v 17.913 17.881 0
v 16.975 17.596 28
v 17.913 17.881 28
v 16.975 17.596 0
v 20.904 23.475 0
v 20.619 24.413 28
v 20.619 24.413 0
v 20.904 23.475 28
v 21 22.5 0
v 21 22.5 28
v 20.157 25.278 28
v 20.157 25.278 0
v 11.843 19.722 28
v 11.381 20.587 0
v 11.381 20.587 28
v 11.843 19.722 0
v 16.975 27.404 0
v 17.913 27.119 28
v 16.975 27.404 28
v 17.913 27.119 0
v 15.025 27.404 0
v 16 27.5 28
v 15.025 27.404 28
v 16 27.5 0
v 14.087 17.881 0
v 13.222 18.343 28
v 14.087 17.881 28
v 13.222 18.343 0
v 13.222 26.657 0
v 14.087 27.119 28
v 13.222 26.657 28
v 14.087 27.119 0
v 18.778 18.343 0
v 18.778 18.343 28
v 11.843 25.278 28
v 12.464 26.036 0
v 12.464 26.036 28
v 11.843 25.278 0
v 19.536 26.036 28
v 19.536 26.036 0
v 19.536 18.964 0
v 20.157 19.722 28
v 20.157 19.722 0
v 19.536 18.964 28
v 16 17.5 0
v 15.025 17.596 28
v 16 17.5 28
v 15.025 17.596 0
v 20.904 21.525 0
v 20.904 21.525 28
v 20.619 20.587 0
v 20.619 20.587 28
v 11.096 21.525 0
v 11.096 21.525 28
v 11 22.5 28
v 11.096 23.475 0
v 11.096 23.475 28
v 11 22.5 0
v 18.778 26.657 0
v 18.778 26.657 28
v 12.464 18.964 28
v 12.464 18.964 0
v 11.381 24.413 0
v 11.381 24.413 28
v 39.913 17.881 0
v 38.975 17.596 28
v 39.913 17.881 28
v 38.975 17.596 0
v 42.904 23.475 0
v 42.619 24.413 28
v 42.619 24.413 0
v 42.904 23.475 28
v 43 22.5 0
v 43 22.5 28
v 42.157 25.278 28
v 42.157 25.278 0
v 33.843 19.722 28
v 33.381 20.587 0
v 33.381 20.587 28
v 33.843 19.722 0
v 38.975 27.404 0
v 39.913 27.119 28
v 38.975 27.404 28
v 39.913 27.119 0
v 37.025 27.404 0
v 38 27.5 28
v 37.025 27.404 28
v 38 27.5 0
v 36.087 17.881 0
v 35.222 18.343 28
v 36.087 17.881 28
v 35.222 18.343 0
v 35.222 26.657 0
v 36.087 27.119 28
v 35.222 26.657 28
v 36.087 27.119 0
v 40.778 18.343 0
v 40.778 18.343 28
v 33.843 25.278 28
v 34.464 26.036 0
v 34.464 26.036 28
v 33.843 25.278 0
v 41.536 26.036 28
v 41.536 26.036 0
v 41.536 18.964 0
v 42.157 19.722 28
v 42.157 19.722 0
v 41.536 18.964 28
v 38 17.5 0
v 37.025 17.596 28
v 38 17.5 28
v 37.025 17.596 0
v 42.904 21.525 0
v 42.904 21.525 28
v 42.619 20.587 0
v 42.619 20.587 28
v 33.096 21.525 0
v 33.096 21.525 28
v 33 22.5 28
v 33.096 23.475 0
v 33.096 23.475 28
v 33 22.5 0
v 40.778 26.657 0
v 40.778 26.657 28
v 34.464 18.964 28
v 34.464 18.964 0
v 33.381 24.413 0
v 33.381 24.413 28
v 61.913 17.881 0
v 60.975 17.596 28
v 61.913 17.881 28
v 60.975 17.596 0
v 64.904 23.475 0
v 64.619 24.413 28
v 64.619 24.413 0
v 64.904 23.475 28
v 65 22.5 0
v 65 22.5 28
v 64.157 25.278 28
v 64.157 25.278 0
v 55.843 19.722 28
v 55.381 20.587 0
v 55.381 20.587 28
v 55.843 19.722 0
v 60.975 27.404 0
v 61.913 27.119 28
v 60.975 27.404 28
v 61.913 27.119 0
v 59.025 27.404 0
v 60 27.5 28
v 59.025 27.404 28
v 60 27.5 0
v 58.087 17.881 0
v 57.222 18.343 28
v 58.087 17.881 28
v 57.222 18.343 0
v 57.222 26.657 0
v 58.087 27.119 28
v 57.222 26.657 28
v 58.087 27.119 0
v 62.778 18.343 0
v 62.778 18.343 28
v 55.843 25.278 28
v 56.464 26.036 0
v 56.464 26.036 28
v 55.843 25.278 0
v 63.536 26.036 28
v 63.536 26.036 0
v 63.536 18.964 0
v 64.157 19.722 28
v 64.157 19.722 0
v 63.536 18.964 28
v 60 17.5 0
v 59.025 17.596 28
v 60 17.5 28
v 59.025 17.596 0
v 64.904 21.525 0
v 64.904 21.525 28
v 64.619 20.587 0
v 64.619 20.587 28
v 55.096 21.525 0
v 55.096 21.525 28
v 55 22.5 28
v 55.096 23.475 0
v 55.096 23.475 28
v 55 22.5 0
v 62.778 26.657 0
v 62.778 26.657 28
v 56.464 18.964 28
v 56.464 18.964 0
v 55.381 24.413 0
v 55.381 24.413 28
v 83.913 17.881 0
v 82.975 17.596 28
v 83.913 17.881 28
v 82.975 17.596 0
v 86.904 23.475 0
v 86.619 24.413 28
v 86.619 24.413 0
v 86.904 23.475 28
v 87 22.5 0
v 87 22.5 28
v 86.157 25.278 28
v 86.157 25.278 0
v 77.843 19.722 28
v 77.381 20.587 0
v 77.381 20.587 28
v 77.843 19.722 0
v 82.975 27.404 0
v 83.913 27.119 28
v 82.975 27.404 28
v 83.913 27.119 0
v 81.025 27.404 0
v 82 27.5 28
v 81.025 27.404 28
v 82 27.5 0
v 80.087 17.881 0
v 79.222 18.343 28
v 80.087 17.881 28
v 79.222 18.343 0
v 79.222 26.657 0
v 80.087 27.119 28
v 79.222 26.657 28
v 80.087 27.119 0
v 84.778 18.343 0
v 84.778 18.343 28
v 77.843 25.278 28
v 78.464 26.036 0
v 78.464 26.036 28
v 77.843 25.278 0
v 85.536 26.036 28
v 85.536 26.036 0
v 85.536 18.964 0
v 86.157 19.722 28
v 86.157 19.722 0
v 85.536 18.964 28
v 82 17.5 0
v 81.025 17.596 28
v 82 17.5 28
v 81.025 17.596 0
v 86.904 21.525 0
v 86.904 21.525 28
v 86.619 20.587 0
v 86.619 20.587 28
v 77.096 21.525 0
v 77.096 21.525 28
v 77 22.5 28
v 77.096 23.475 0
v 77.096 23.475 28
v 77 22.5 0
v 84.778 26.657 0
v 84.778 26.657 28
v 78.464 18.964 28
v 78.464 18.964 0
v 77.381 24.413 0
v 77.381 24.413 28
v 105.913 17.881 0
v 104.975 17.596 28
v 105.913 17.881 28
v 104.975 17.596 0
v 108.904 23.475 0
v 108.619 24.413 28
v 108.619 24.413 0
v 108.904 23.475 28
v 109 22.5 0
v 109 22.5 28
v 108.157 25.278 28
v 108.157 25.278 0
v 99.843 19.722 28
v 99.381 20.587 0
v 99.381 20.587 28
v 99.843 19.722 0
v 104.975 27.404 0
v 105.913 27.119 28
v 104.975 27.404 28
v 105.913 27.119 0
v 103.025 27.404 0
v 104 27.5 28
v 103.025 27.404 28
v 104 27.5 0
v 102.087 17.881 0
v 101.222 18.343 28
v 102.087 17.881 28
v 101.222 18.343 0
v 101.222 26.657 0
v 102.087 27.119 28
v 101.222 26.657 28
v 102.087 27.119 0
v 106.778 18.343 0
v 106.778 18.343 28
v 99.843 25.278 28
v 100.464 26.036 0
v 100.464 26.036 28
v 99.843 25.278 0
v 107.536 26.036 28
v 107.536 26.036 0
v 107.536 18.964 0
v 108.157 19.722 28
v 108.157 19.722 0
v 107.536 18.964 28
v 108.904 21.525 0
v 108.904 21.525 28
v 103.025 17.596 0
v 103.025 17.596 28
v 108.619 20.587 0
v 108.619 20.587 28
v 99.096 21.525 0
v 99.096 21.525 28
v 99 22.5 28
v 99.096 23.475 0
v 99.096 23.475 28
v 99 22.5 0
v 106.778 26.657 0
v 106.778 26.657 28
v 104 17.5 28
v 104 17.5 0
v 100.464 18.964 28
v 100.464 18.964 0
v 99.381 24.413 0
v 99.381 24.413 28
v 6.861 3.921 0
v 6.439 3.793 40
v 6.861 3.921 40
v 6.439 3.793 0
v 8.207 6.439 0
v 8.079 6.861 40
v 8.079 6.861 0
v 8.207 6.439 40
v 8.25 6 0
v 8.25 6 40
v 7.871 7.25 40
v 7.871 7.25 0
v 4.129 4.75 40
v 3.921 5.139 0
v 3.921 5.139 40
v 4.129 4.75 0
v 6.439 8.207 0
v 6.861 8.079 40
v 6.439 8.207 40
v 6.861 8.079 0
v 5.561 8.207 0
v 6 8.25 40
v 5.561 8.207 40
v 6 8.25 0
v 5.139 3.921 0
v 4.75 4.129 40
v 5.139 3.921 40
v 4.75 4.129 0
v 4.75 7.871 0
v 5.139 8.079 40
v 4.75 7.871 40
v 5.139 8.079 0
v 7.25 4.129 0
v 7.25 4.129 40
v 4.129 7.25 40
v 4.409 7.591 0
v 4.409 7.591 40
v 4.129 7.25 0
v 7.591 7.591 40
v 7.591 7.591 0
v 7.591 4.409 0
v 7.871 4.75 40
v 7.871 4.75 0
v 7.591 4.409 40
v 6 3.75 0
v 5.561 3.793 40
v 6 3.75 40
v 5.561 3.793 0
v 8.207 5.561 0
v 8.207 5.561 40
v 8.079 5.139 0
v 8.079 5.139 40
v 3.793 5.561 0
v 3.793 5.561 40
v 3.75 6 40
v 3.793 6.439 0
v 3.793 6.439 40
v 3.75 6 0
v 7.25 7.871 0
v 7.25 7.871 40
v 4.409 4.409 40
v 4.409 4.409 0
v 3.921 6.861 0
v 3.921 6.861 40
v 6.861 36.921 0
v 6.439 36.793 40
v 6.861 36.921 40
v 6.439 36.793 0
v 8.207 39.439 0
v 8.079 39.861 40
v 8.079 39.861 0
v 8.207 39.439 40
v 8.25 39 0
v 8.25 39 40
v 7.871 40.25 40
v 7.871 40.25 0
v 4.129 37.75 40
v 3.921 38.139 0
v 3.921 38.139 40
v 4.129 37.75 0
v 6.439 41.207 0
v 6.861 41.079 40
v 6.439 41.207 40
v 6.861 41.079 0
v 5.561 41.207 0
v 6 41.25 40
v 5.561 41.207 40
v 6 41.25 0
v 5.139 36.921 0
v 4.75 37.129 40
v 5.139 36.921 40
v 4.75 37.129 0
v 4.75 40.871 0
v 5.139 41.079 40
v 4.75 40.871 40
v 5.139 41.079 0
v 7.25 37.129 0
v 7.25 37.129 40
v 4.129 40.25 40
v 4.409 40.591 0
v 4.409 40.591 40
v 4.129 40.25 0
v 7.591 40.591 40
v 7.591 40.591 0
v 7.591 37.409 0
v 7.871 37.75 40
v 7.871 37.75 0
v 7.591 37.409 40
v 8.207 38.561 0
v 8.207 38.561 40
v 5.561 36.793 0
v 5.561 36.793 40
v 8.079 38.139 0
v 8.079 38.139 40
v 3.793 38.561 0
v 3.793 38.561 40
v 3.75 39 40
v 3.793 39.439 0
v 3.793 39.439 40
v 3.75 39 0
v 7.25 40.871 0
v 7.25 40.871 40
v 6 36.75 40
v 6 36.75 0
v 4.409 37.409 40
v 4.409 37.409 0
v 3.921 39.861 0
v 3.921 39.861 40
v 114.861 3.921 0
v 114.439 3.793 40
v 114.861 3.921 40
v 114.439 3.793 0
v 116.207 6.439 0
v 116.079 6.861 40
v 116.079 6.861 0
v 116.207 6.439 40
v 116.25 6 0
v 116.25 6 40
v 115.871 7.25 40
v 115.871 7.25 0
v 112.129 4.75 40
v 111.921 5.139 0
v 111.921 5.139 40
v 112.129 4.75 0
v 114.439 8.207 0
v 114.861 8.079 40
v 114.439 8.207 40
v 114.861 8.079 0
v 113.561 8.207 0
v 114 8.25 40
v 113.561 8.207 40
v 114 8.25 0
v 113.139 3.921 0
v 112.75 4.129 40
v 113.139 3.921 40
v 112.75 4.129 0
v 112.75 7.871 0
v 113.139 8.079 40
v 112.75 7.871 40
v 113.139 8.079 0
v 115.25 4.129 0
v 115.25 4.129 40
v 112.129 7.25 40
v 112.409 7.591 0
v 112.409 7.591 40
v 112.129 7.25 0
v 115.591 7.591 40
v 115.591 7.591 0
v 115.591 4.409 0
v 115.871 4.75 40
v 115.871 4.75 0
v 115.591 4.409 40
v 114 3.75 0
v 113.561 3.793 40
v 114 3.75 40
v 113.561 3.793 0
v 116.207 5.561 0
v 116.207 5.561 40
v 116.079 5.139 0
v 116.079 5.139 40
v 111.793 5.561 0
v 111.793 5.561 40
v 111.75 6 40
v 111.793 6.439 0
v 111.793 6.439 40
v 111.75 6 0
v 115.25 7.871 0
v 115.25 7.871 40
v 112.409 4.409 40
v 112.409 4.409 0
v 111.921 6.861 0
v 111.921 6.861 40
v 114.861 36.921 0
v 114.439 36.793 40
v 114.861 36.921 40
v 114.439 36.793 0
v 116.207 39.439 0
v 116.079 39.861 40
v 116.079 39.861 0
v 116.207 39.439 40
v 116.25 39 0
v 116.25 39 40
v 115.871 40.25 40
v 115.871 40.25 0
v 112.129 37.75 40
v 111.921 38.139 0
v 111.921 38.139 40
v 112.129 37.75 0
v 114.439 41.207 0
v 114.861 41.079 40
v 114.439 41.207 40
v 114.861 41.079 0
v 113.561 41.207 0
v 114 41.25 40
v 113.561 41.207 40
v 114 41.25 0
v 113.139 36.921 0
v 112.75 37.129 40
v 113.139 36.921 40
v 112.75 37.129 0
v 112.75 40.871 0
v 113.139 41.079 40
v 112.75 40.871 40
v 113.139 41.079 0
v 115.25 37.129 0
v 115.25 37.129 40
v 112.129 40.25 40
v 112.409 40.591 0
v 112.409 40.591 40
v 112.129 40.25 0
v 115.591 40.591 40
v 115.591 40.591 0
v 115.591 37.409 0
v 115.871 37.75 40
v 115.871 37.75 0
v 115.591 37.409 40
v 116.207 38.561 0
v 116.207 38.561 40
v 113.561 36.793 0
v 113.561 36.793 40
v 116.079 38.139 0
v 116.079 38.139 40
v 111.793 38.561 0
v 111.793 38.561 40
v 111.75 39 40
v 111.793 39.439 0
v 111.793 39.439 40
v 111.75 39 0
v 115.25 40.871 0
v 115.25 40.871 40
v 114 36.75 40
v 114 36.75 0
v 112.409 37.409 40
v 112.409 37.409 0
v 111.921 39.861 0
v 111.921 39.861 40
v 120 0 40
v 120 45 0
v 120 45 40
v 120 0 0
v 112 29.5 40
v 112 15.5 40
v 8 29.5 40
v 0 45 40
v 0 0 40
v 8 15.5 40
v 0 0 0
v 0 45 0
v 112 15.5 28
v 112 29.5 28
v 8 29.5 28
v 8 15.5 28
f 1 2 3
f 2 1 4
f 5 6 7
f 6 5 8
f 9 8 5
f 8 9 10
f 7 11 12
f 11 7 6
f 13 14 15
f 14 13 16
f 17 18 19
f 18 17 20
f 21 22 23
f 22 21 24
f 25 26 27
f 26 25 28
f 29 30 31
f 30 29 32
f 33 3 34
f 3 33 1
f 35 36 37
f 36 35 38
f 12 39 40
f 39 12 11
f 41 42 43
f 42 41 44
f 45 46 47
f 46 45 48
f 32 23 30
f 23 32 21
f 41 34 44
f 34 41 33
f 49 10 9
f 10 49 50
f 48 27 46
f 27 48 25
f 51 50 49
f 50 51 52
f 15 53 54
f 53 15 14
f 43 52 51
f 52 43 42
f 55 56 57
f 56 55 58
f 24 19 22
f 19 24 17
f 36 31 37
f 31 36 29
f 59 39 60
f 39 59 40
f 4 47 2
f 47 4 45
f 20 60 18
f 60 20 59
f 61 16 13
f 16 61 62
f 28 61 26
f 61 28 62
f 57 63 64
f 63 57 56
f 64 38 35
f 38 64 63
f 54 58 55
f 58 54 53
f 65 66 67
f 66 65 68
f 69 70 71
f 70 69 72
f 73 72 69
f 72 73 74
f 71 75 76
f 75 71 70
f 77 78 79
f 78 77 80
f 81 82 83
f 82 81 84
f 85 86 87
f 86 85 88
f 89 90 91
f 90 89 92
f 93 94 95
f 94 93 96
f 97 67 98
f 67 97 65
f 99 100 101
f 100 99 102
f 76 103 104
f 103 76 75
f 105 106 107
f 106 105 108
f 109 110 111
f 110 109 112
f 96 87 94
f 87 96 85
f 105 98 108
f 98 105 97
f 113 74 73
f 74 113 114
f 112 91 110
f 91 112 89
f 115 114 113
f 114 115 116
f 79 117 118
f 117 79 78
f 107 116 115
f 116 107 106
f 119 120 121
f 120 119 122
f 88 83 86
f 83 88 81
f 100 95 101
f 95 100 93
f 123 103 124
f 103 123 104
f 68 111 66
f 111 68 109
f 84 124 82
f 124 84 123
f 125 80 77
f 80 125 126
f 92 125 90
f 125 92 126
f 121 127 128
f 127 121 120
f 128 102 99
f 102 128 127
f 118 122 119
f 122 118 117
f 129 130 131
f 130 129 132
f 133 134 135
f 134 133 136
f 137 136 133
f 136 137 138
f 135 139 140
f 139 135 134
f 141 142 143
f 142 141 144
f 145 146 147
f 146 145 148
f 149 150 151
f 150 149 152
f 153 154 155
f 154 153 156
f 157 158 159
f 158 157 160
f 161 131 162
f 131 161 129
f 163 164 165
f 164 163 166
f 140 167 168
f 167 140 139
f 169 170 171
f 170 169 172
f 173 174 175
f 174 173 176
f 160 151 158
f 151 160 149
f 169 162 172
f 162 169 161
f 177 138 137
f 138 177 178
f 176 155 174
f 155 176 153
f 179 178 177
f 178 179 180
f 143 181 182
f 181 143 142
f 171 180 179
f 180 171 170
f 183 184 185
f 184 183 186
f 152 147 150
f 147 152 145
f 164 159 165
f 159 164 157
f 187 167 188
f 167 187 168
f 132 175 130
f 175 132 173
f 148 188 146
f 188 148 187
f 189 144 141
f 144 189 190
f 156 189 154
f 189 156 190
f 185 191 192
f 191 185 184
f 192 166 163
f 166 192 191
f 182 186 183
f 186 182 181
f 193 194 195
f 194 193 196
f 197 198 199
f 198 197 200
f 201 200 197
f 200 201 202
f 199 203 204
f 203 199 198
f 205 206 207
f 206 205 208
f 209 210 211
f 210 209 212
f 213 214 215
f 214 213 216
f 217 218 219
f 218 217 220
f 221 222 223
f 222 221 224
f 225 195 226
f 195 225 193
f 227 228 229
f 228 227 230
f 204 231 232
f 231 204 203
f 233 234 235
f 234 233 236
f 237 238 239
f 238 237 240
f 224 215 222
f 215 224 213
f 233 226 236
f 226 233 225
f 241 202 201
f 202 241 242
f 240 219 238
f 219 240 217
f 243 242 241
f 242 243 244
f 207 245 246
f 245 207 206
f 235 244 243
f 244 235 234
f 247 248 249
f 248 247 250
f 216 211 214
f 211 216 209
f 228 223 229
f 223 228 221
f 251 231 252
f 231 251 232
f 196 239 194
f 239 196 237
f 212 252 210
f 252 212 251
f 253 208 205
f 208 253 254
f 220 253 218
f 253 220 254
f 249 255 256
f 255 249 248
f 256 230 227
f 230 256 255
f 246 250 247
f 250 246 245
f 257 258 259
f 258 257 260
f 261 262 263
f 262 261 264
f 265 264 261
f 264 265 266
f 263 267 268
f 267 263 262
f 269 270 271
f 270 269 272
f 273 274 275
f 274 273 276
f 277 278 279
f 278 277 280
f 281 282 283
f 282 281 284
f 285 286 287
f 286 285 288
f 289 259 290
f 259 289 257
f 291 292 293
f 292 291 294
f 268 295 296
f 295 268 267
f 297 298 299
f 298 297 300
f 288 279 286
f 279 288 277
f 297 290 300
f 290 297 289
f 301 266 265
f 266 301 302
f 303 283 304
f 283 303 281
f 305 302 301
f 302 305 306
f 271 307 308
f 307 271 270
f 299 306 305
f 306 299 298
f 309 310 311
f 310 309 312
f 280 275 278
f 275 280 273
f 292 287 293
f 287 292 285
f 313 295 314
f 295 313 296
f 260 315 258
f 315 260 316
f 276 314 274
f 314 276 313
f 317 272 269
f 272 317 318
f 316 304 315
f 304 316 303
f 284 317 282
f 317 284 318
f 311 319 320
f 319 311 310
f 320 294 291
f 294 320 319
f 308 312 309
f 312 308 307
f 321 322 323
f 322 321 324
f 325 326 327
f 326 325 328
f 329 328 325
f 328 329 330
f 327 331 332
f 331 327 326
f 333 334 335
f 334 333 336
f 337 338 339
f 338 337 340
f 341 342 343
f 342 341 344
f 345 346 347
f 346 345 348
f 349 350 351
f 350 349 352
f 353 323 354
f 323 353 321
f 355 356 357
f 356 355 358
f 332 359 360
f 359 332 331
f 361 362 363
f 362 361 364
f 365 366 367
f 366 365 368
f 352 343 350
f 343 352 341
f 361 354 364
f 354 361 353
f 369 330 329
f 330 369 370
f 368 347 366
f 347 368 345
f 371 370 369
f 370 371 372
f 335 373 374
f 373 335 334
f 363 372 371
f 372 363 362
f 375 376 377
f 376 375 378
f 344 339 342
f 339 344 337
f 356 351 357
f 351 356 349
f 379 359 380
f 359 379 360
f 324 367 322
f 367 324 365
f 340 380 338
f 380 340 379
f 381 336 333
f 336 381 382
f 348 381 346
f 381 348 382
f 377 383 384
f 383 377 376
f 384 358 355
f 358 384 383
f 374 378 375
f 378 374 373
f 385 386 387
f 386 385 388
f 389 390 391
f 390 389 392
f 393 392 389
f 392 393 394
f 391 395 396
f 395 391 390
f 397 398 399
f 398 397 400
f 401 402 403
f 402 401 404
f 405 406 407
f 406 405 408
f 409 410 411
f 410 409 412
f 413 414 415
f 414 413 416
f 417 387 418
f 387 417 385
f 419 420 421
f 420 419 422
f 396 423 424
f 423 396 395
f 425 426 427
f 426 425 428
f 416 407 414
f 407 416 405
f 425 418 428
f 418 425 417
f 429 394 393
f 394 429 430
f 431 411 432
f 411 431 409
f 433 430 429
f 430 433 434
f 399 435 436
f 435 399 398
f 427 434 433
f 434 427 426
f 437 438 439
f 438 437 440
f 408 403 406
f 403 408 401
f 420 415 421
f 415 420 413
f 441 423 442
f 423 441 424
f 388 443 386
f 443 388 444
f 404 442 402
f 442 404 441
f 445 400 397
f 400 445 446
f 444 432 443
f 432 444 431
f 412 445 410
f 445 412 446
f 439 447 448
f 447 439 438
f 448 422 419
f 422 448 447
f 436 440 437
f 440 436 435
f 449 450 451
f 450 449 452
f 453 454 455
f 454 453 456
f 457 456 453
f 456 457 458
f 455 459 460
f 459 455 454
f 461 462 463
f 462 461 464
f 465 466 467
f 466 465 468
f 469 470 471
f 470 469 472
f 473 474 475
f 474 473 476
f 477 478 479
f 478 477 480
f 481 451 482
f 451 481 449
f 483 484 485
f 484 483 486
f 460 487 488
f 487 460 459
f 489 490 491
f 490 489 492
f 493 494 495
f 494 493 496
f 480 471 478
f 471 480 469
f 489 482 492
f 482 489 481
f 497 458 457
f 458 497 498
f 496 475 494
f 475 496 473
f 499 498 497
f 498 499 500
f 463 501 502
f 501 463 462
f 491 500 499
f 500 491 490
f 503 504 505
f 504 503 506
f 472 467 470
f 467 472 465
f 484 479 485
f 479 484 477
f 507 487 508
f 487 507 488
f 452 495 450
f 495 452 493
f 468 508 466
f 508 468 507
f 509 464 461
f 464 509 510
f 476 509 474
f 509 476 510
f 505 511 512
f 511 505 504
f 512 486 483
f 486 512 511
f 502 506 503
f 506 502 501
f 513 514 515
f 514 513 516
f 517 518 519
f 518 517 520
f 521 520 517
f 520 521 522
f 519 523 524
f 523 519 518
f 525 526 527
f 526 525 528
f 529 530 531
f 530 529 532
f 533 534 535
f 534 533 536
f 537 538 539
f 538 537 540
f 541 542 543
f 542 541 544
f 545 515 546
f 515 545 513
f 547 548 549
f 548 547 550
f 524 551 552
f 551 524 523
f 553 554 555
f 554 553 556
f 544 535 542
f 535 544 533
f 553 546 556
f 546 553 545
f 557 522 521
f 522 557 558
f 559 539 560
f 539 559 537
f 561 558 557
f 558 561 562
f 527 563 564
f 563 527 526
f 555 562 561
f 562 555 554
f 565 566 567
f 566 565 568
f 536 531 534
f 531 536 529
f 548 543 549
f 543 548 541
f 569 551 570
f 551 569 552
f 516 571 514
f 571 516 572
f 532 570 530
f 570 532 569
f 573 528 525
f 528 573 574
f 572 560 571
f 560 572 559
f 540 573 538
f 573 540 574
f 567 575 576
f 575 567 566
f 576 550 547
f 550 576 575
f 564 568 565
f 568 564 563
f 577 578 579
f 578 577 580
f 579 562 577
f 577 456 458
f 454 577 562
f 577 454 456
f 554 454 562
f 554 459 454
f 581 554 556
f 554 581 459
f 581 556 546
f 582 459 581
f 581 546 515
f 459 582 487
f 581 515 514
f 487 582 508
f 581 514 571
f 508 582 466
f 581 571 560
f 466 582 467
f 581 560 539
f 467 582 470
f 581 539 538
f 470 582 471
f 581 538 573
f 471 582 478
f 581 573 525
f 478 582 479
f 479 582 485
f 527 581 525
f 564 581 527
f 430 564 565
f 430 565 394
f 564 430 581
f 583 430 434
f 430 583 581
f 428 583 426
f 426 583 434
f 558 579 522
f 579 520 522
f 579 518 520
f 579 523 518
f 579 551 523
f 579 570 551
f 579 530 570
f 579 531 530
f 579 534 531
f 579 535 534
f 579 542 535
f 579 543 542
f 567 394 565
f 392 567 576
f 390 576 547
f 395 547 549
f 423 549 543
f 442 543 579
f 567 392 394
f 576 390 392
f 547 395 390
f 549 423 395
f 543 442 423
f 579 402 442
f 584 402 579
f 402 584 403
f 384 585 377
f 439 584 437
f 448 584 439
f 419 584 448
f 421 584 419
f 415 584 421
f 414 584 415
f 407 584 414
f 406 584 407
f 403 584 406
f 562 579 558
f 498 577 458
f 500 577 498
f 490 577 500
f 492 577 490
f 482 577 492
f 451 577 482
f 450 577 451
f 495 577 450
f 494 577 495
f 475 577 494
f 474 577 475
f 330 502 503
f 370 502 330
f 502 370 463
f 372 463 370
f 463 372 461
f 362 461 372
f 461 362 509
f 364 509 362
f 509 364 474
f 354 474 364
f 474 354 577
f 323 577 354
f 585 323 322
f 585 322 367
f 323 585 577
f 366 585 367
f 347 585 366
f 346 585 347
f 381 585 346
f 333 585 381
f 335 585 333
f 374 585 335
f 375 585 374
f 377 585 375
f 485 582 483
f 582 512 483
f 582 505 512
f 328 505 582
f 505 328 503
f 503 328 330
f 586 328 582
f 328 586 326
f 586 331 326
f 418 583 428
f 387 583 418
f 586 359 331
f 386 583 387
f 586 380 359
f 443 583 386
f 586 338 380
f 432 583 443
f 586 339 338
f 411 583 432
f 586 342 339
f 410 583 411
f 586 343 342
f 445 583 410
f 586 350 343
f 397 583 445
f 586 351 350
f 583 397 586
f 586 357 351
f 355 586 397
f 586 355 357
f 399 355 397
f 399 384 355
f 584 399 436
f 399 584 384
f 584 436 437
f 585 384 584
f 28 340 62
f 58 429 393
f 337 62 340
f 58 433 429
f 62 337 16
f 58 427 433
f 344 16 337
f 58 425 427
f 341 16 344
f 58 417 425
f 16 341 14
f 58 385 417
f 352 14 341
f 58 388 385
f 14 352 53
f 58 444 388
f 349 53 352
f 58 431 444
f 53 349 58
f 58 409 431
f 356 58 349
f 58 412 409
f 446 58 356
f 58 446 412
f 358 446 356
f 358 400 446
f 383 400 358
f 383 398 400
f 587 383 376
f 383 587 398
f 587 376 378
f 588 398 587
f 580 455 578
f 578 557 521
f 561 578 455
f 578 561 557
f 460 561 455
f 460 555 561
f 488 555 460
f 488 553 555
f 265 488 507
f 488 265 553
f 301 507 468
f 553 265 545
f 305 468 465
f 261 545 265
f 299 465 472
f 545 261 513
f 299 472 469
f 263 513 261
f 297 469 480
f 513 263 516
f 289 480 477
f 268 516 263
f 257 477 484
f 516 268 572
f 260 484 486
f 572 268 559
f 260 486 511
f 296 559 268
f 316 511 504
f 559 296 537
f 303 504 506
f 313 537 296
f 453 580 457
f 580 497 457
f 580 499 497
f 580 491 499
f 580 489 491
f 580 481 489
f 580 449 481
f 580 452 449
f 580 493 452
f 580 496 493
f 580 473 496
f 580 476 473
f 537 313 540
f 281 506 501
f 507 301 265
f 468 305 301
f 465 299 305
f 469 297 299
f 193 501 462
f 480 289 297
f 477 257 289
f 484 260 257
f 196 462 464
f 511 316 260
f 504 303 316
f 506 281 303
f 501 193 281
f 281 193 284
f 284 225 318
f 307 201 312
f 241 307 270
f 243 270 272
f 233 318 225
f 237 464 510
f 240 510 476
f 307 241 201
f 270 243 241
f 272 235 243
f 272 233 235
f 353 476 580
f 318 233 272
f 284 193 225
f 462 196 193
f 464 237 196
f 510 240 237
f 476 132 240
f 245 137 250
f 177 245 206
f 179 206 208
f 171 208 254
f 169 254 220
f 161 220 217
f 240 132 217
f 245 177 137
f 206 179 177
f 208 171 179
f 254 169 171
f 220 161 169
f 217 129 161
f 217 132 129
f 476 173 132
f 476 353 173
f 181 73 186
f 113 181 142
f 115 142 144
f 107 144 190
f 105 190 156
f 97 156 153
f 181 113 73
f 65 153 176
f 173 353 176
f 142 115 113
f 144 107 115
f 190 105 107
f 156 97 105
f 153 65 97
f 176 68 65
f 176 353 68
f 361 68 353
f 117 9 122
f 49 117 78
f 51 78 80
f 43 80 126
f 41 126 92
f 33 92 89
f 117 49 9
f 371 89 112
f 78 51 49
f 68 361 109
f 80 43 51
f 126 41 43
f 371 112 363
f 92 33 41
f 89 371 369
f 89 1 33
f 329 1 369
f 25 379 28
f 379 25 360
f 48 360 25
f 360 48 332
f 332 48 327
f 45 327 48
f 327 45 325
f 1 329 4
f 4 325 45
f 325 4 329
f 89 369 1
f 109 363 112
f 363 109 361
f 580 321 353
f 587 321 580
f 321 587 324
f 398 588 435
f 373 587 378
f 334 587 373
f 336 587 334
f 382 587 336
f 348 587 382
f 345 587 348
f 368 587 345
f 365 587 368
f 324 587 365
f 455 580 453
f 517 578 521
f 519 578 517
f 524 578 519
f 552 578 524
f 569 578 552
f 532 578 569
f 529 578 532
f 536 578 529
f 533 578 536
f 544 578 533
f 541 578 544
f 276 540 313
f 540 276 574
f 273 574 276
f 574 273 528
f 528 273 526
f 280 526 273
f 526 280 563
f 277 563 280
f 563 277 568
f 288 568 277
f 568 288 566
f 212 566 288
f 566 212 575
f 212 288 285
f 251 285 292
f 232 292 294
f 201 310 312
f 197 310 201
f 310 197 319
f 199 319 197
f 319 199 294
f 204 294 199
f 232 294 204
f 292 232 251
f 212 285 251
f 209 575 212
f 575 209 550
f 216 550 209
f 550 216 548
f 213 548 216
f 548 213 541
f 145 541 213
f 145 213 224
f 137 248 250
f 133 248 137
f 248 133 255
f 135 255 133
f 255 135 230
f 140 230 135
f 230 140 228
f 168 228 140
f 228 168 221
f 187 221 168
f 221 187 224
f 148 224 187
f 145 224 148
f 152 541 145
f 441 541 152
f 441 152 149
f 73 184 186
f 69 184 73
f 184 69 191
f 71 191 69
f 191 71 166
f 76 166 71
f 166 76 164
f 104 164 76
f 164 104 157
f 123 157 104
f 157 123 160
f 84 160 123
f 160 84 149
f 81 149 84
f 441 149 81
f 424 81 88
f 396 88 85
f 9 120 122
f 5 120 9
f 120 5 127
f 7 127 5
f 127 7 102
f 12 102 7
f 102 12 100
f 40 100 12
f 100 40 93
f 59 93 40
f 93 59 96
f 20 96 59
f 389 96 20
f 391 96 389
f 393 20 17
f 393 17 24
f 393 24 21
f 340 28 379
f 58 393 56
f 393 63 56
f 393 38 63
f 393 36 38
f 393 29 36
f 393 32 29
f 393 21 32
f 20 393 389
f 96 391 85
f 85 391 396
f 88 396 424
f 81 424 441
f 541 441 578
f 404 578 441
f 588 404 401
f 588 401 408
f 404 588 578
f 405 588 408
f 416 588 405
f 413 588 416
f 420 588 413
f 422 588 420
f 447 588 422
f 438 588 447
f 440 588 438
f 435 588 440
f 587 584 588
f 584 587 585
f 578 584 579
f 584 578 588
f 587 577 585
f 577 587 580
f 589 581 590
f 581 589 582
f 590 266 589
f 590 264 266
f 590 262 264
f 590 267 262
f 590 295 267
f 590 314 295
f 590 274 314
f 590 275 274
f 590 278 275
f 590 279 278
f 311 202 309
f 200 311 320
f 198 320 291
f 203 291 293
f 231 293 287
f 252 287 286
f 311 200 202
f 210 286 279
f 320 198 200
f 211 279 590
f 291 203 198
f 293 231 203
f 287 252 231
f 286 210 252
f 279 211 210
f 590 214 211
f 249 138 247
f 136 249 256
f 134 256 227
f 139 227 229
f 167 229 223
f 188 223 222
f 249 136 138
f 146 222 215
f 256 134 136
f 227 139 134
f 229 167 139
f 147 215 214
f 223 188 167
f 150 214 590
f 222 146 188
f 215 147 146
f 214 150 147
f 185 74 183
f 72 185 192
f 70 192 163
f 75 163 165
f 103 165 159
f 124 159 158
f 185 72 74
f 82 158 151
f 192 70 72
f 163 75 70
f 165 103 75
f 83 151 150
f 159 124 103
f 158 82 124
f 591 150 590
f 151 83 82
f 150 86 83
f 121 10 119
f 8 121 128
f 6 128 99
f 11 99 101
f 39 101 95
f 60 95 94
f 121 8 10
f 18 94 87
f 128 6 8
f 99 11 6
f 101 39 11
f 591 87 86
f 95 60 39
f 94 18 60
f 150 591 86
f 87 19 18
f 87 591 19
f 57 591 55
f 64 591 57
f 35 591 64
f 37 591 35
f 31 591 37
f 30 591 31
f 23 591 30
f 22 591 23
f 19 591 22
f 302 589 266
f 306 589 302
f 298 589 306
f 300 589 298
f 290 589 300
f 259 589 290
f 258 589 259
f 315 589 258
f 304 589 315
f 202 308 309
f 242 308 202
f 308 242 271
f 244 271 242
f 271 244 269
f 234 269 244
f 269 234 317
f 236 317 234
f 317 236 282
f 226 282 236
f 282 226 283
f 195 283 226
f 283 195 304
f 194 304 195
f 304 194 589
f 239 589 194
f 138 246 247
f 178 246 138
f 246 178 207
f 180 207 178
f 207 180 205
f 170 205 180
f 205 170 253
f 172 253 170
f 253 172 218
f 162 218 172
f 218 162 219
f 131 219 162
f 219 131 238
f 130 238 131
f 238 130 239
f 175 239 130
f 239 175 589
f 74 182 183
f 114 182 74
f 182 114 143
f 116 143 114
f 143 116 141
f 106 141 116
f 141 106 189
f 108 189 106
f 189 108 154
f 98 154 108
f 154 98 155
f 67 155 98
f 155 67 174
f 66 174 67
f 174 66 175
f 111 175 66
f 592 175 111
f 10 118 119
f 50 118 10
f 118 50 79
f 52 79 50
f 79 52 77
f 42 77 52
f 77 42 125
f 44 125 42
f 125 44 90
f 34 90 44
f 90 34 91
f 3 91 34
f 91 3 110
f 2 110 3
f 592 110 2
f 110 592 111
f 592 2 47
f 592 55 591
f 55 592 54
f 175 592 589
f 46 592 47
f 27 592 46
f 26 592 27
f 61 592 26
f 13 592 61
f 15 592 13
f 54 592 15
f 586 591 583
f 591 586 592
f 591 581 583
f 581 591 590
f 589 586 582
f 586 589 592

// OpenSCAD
$fn = 32;

// ----------------------------------------------------------------------
// Manifold block: gallery_top manifold
// ----------------------------------------------------------------------

// --- parameters (mm) ---
block_l = 120;            // block length, X
block_w = 45;             // block width, Y
block_h = 40;             // block height, Z
port_d = 10;              // port bore diameter
port_pitch = 22;          // port pitch along X
gallery_d = 14;           // top gallery width, Y
gallery_depth = 12;       // gallery pocket depth
wall_p = 8;               // gallery end wall thickness, X
mnt_d = 4.5;              // mounting hole diameter
mnt_in = 6;               // mounting hole inset from the edges

n_ports = 5;  // ports in the row
port_x0 = (block_l - (n_ports - 1) * port_pitch) / 2;  // first port X

difference() {
  cube([block_l, block_w, block_h]);
  for (i = [0 : n_ports - 1])
    translate([port_x0 + i * port_pitch, block_w / 2, -1])
      cylinder(h = block_h + 2, d = port_d);
  translate([wall_p, block_w / 2 - gallery_d / 2, block_h - gallery_depth])
    cube([block_l - 2 * wall_p, gallery_d, gallery_depth + 1]);
  for (cx = [mnt_in, block_l - mnt_in])
    for (cy = [mnt_in, block_w - mnt_in])
      translate([cx, cy, -1]) cylinder(h = block_h + 2, d = mnt_d);
}
